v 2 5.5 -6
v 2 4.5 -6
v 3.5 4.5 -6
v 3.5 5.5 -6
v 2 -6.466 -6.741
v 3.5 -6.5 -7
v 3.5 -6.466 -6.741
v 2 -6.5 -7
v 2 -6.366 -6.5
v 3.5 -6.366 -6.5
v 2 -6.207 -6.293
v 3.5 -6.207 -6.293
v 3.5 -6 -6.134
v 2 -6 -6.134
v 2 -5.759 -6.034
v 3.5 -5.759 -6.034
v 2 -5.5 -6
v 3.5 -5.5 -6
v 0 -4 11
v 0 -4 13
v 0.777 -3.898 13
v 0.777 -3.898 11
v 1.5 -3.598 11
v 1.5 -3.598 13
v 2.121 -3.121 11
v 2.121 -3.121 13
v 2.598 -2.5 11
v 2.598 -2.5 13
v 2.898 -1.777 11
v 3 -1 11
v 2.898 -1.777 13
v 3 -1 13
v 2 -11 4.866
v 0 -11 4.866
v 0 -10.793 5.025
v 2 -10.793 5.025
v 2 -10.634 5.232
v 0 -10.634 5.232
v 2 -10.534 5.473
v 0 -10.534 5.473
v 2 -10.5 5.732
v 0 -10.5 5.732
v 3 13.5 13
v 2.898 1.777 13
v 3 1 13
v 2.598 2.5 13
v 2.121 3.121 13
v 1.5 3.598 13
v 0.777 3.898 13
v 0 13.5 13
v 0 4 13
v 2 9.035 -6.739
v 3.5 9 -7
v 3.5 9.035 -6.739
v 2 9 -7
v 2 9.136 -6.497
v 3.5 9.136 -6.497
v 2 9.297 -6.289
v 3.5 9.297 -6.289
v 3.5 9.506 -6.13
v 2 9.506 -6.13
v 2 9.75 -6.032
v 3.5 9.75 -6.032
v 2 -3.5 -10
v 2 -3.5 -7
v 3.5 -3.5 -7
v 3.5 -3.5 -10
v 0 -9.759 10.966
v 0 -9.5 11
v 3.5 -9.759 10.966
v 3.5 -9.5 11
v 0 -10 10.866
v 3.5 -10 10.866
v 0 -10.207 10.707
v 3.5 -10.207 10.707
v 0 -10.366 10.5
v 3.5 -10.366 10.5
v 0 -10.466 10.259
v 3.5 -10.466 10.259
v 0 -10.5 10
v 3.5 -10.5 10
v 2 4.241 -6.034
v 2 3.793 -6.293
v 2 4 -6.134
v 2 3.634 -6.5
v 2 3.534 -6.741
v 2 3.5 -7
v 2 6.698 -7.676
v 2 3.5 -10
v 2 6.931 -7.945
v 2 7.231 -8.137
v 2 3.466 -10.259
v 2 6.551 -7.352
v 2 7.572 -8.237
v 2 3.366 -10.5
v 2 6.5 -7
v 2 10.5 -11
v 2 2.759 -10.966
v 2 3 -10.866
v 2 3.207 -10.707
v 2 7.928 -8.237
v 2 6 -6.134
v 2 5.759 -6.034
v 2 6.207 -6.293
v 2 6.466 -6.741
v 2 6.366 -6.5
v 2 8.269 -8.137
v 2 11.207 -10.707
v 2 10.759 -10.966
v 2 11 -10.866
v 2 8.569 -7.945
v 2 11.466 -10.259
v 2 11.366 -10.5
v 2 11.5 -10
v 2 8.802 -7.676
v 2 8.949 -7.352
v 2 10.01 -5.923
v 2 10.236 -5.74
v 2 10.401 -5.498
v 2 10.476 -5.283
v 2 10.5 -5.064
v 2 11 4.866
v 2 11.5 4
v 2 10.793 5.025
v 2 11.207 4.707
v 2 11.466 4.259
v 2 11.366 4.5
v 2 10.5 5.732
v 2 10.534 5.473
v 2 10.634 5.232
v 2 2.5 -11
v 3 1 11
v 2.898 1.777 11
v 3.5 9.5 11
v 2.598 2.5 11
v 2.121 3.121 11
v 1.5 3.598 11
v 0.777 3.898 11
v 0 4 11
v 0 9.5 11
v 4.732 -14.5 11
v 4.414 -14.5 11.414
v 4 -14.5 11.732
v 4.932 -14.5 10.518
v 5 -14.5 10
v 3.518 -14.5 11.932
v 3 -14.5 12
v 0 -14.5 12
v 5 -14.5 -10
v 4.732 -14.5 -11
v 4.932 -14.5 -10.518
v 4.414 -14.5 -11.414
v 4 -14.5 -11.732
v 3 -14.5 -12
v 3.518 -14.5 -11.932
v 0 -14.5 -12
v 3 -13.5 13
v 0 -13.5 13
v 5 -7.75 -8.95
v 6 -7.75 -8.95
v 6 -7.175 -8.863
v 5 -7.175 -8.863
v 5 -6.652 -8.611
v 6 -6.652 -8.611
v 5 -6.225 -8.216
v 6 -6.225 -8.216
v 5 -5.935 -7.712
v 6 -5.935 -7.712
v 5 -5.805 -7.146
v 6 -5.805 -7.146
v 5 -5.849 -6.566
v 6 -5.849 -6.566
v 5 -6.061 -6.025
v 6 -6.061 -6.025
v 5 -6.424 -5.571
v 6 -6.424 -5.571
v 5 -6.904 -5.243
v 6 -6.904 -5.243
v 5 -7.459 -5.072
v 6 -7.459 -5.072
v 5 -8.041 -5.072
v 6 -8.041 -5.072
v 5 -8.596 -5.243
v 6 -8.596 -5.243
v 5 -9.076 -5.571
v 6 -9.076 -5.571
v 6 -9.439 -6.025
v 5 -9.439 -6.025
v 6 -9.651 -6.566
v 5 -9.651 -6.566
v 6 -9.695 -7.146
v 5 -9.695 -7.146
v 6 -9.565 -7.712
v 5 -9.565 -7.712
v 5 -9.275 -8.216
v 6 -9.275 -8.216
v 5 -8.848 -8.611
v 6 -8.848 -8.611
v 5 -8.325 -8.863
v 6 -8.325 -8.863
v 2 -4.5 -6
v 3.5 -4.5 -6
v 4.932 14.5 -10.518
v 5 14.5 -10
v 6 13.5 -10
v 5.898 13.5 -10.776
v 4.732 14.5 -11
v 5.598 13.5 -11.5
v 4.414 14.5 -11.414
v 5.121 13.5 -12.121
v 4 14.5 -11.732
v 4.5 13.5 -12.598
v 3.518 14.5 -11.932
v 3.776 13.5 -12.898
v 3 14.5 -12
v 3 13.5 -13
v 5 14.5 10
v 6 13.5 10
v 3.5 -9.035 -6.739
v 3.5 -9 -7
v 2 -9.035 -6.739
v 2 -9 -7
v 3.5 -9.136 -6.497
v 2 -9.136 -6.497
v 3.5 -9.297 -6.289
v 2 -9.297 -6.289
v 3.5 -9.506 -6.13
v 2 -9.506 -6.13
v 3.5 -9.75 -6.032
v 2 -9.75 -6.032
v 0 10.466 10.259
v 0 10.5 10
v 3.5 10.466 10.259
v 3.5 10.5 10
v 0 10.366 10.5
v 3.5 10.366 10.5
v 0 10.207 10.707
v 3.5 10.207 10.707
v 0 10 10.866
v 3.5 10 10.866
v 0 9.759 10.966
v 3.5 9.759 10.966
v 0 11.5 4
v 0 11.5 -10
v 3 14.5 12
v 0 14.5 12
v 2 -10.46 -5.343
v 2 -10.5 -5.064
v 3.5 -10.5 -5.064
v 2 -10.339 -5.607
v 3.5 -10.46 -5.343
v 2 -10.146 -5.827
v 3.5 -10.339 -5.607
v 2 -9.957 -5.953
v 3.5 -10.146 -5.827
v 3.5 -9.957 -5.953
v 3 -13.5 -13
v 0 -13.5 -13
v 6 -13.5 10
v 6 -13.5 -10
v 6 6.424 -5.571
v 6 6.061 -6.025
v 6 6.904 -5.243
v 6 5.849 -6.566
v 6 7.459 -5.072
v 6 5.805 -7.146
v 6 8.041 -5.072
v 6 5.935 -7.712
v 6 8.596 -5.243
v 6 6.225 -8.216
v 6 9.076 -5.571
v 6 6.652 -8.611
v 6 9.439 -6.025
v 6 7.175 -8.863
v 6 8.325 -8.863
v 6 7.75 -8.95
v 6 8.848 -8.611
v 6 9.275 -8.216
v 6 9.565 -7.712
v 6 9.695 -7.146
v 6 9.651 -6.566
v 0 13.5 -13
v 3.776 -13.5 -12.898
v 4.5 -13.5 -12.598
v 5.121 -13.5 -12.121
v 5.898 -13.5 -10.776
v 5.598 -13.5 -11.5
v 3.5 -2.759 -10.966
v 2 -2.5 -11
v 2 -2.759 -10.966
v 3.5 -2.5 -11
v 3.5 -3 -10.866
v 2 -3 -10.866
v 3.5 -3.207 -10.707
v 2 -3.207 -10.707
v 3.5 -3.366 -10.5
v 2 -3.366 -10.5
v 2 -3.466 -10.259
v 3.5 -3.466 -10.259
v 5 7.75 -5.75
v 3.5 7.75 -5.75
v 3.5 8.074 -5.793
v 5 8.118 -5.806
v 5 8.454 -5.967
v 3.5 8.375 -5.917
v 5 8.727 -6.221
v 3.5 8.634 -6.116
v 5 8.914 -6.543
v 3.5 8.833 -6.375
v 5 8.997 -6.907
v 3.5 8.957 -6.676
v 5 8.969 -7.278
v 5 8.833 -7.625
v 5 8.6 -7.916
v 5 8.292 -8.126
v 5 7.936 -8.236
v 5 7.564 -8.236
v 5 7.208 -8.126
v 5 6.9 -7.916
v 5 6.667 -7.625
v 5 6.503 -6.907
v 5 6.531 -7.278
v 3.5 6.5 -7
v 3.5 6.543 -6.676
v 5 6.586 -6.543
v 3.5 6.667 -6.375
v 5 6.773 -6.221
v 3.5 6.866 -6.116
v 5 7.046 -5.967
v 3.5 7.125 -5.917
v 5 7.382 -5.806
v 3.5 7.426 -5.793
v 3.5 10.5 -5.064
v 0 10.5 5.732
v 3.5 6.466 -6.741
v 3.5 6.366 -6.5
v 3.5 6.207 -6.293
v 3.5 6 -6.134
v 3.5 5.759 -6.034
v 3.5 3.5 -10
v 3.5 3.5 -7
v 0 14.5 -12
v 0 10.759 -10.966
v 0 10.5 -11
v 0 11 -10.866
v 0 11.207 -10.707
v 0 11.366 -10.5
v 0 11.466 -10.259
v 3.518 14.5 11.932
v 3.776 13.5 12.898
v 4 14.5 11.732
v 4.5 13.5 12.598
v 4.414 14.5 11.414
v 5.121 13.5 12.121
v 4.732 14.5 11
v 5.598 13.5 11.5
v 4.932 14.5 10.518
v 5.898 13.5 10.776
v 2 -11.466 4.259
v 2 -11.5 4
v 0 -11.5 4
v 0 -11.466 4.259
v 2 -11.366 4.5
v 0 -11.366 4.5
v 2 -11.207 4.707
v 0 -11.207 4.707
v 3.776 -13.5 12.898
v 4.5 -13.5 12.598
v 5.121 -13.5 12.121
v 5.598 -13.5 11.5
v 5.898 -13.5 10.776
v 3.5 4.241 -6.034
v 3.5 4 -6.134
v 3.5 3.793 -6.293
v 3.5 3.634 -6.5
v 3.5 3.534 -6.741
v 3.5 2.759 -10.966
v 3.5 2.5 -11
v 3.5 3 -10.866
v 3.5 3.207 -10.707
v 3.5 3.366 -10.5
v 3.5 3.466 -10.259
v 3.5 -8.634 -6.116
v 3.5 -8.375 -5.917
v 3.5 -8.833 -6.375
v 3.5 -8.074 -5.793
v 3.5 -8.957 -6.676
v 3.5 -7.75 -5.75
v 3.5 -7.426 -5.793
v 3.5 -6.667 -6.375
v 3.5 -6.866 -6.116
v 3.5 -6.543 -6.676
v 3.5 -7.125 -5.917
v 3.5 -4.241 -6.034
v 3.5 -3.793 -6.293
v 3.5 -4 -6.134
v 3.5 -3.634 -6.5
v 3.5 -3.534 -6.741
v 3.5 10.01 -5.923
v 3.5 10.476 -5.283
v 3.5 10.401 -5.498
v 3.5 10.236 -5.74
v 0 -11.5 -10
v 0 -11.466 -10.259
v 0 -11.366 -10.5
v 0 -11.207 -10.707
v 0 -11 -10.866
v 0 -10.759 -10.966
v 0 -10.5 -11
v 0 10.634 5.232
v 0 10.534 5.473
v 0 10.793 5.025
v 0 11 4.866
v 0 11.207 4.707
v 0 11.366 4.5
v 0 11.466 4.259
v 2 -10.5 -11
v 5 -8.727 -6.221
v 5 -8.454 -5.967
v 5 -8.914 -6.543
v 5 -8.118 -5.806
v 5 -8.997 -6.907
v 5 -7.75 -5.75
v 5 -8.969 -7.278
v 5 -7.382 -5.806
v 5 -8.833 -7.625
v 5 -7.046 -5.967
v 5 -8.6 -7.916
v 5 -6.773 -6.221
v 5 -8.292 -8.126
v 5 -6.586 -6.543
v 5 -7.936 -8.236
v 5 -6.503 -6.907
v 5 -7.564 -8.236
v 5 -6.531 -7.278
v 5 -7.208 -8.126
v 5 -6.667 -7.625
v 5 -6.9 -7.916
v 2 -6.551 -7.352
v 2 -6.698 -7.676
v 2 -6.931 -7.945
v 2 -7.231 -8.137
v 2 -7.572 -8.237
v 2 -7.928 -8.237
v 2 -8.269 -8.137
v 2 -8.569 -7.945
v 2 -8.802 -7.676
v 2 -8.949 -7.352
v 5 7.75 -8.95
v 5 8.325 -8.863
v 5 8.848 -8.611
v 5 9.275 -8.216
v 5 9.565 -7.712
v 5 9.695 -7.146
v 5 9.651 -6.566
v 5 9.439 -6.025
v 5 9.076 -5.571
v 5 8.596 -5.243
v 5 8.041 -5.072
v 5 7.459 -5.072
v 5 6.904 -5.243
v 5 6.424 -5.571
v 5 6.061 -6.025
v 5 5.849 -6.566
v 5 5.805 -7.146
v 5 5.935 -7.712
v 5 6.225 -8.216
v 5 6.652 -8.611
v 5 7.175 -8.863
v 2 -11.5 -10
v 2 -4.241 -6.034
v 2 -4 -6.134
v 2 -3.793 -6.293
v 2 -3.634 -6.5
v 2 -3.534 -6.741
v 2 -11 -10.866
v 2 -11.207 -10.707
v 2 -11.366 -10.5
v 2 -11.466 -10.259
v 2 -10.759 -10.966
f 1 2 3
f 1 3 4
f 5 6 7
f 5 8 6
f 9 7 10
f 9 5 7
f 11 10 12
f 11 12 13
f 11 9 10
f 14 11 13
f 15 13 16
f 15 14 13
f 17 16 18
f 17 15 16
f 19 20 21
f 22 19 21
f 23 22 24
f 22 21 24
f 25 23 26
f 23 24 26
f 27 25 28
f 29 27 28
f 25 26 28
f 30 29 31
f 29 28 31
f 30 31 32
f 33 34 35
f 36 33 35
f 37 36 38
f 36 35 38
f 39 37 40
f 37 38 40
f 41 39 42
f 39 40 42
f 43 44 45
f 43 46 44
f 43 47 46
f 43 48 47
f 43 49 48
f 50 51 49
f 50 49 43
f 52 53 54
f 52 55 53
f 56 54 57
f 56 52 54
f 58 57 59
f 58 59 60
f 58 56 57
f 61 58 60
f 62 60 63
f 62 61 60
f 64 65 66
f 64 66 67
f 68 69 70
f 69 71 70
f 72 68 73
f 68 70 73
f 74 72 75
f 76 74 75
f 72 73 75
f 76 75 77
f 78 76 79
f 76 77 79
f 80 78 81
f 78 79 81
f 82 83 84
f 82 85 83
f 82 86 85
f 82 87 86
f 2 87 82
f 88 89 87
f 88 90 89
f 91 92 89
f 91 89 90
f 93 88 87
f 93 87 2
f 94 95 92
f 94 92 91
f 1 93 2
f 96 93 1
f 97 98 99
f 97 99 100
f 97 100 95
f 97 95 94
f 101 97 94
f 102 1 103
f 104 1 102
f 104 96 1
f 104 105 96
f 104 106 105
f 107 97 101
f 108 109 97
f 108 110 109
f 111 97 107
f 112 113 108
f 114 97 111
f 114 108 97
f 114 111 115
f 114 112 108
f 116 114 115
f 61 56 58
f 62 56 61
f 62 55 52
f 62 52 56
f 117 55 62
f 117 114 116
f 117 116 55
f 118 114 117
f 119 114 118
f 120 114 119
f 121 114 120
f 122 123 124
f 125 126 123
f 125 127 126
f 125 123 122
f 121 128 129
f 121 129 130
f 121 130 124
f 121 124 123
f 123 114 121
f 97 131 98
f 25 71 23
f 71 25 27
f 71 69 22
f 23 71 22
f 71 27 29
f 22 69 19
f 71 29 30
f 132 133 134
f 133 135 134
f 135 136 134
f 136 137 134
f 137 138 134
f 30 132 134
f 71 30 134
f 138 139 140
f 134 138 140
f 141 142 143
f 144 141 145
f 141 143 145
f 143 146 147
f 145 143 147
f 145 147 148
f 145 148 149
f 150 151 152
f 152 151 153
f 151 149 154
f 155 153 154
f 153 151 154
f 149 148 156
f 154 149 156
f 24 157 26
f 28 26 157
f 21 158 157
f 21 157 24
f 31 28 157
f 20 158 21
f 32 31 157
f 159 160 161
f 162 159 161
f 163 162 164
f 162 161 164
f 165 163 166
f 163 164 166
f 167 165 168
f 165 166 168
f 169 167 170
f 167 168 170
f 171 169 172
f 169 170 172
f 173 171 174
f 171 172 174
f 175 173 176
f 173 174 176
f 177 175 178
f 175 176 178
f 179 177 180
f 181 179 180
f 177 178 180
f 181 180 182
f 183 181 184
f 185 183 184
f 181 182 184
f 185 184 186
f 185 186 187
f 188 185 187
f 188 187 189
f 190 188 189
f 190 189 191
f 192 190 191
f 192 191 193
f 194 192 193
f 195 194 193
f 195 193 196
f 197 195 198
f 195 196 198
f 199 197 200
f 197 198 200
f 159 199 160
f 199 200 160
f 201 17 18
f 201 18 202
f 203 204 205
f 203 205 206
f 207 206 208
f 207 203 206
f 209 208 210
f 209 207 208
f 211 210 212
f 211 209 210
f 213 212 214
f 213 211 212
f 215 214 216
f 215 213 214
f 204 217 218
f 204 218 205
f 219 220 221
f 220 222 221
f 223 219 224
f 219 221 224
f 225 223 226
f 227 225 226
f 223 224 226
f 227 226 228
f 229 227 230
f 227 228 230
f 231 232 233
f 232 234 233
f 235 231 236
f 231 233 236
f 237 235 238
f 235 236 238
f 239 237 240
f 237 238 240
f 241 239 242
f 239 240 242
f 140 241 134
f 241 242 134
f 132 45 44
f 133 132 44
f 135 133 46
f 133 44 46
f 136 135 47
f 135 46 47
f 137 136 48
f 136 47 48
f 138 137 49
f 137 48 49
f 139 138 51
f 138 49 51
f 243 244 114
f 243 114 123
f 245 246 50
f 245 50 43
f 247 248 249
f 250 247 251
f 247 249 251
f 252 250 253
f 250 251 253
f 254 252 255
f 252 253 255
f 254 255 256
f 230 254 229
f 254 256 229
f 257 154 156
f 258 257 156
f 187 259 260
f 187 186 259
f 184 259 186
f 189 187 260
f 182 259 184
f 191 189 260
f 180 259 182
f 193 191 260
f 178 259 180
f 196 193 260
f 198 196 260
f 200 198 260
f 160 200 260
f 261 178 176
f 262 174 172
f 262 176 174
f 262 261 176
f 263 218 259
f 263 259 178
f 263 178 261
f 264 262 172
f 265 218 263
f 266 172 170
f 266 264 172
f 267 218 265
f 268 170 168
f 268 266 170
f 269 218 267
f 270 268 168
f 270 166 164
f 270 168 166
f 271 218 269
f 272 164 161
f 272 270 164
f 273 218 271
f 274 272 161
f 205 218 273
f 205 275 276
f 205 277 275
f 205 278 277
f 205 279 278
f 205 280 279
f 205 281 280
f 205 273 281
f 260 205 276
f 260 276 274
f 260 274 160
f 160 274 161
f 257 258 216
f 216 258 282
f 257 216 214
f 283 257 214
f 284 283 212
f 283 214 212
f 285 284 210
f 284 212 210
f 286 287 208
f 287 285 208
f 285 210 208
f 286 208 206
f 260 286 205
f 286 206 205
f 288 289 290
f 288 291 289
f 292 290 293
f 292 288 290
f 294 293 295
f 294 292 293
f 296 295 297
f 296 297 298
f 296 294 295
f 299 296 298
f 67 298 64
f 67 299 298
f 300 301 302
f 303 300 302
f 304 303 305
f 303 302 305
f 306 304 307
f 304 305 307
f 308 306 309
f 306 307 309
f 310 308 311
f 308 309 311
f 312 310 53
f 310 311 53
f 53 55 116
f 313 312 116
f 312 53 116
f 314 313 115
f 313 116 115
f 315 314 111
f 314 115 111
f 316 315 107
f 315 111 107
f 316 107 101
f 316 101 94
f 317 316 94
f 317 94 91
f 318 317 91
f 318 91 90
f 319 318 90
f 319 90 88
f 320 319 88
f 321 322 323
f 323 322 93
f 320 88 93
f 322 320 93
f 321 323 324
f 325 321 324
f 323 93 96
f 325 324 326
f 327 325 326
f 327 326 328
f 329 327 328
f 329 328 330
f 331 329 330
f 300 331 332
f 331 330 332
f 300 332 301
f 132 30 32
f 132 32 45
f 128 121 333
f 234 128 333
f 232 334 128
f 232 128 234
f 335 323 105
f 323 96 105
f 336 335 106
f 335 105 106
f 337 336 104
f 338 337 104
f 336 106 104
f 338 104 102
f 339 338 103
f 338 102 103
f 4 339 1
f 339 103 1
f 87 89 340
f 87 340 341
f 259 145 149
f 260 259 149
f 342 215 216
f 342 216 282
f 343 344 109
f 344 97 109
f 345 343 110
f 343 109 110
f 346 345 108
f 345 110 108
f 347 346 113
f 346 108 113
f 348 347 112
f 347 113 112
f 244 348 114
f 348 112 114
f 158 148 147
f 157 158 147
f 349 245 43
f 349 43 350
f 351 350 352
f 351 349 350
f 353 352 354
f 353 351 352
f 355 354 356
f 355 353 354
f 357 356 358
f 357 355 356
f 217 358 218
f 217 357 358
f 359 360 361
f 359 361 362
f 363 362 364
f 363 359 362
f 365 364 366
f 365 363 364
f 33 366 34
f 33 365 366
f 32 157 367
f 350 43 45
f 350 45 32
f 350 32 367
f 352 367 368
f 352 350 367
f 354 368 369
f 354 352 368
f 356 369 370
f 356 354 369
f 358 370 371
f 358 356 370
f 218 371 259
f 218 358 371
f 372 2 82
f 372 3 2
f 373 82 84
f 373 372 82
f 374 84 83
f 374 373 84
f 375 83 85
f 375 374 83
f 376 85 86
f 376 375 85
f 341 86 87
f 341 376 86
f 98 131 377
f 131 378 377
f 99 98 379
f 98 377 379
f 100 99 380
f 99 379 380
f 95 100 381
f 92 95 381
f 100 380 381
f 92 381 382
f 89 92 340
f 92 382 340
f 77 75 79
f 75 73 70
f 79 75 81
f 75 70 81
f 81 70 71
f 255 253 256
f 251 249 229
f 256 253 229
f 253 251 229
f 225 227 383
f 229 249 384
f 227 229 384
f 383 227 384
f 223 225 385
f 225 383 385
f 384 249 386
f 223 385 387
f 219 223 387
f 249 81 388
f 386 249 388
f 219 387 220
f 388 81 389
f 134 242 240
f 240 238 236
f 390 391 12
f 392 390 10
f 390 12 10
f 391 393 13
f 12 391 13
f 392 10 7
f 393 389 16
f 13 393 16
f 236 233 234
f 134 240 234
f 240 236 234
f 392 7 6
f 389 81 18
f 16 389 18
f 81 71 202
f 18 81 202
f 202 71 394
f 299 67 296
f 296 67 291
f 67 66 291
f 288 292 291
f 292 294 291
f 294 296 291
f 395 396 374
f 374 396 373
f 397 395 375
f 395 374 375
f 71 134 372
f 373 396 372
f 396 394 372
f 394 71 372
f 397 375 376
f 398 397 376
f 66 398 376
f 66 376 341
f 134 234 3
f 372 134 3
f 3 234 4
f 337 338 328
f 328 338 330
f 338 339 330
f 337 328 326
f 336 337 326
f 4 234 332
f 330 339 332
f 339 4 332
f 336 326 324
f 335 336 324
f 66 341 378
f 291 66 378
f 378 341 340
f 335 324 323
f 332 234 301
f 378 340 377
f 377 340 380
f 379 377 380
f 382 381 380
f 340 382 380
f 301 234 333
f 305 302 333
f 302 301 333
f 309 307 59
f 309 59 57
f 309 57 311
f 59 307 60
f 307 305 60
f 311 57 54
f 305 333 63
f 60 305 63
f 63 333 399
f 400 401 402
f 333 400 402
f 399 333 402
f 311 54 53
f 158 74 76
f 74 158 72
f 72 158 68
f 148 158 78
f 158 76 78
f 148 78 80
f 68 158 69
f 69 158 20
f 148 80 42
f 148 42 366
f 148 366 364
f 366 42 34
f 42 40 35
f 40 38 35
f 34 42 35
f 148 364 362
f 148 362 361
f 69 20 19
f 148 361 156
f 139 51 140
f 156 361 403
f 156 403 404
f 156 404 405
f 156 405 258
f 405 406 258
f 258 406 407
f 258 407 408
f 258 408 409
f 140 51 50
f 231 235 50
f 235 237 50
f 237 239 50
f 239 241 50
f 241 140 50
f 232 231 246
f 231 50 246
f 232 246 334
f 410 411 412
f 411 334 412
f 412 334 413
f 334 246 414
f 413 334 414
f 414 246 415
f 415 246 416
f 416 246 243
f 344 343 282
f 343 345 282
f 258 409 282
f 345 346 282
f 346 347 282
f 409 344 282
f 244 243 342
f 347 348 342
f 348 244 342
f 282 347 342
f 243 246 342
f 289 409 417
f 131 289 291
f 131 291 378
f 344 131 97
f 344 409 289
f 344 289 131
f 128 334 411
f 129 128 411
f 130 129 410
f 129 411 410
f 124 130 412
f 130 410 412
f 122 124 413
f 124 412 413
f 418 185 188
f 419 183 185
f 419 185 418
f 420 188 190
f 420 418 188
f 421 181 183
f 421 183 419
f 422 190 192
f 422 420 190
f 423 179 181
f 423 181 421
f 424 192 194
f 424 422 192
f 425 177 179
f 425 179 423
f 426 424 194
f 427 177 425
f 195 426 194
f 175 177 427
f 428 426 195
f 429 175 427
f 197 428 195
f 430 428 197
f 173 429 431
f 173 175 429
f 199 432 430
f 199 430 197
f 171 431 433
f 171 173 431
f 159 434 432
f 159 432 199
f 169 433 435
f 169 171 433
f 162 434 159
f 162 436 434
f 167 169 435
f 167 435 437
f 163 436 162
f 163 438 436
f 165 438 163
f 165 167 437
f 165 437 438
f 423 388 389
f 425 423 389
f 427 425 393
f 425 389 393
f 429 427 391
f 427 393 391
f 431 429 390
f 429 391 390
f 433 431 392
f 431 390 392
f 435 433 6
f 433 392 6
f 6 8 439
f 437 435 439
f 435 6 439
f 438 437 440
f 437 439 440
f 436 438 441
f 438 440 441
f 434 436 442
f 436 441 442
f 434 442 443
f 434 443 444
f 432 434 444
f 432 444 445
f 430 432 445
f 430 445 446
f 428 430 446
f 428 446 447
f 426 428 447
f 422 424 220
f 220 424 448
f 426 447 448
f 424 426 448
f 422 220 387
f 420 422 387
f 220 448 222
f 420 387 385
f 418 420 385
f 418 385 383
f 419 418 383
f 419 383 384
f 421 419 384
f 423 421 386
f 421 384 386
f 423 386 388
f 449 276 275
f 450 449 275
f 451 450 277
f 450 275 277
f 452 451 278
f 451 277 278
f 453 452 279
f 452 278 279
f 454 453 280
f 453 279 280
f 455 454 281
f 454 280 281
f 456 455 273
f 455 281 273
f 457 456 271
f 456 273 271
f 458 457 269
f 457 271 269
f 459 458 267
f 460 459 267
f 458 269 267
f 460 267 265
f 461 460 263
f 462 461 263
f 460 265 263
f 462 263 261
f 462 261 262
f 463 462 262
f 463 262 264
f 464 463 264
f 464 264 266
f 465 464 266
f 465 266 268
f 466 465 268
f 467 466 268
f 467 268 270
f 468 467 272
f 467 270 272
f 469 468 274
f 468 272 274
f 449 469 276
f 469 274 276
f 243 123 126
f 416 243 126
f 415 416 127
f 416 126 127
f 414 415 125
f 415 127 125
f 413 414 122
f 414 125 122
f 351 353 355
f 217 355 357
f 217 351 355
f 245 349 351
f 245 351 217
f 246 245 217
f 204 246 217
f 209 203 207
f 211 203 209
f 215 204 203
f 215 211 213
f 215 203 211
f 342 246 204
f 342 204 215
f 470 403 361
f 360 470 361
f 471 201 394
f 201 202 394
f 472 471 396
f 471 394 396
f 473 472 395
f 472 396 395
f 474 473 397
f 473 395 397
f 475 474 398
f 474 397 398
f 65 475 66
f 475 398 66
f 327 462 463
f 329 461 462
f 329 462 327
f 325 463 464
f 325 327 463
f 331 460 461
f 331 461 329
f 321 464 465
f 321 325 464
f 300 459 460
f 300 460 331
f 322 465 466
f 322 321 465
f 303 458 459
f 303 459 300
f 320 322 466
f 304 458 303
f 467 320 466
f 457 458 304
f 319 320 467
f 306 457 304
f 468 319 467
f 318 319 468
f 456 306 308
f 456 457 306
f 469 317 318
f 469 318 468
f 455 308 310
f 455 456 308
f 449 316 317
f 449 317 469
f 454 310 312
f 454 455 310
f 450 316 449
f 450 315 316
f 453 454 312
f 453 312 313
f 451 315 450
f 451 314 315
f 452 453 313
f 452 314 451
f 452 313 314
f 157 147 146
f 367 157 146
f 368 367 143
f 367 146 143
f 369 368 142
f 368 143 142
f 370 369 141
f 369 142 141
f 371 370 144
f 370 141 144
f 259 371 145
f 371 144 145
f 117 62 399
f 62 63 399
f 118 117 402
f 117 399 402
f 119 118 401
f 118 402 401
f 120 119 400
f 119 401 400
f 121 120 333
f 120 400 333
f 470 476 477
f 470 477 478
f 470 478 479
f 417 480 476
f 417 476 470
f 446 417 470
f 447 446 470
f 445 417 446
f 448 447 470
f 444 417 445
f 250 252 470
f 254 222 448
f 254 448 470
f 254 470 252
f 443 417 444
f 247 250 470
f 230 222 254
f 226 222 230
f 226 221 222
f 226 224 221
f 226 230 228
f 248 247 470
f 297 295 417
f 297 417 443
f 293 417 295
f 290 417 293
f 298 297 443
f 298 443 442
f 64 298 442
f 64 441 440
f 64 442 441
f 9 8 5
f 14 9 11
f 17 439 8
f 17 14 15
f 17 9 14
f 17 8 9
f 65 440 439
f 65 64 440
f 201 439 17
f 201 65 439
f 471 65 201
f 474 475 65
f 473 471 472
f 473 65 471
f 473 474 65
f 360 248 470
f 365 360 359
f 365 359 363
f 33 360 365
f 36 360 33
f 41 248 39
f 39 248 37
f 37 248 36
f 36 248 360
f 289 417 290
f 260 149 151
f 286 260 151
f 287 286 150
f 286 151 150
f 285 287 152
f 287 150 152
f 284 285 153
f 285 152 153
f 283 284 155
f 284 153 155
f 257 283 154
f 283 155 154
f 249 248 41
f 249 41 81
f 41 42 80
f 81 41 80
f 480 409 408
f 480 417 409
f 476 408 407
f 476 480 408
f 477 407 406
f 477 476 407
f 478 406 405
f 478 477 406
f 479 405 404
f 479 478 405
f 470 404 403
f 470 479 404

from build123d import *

# Parameters (mm, degrees)
SKETCH_1_W          = 26
SKETCH_1_H          = 29
EXTRUDE_1_DEPTH     = 6
SKETCH_2_R          = 1.25
CUT_EXTRUDE_1_DEPTH = 21.377683872
SKETCH_4_W          = 16
SKETCH_4_H          = 23
CUT_EXTRUDE_3_DEPTH = 2
CUT_EXTRUDE_4_DEPTH = 1.5
FILLET_1_R          = 1
SKETCH_6_R          = 1.95
CUT_EXTRUDE_5_DEPTH = 1
FILLET_3_R          = 3
SKETCH_8_W          = 6
SKETCH_8_H          = 21
CUT_EXTRUDE_6_DEPTH = 3.5
FILLET_2_R          = 1
FILLET_4_R          = 1
CUT_EXTRUDE_7_REACH = 30.675
SKETCH_9_W          = 6
SKETCH_9_H          = 8
FILLET_5_R          = 3
CHAMFER_2_SIZE      = 1


# Some blends are built 0.0001 mm under size
with BuildPart() as part:
    # Эскиз1 → Бобышка-Вытянуть1 (new body)
    with BuildSketch(Plane(origin=(0, 0, 0), x_dir=(0, 0, -1), z_dir=(1, 0, 0))):
        Rectangle(SKETCH_1_W, SKETCH_1_H)
    extrude(amount=EXTRUDE_1_DEPTH)

    # Эскиз2 → Вырез-Вытянуть1 (cut, through all)
    with BuildSketch(Plane.ZY):
        with Locations((-7, 7.75)):
            Circle(SKETCH_2_R)
        with Locations((-7, -7.75)):
            Circle(SKETCH_2_R)
    extrude(amount=-CUT_EXTRUDE_1_DEPTH, mode=Mode.SUBTRACT)

    # Эскиз4 → Вырез-Вытянуть3 (cut)
    with BuildSketch(Plane.ZY):
        with Locations((-3, 0)):
            Rectangle(SKETCH_4_W, SKETCH_4_H)
    extrude(amount=-CUT_EXTRUDE_3_DEPTH, mode=Mode.SUBTRACT)

    # Эскиз5 → Вырез-Вытянуть4 (cut)
    with BuildSketch(Plane.ZY.offset(-2)):
        Polygon((-11, -3.5), (-11, 3.5), (-6, 3.5), (-6, 10.5), (5, 10.5), (5, -10.5), (-6, -10.5), (-6, -3.5), align=None)
    extrude(amount=-CUT_EXTRUDE_4_DEPTH, mode=Mode.SUBTRACT)

    # Скругление1
    fillet_1_edges = [part.edges().sort_by_distance(p)[0] for p in [
        (2.75, 7, -6),
        (2.75, 3.5, -6),
        (2.75, 8.5, -6),
        (2.75, -8.5, -6),
        (2.75, -7, -6),
        (2.75, 3.5, -11),
        (2.75, -3.5, -6),
        (2.75, -3.5, -11),
    ]]
    fillet(fillet_1_edges, radius=FILLET_1_R)

    # Эскиз6 → Вырез-Вытянуть5 (cut)
    with BuildSketch(Plane(origin=(6, 0, 0), x_dir=(0, 0, -1), z_dir=(1, 0, 0))):
        with Locations((7, 7.75)):
            Circle(SKETCH_6_R)
        with Locations((7, -7.75)):
            Circle(SKETCH_6_R)
    extrude(amount=-CUT_EXTRUDE_5_DEPTH, mode=Mode.SUBTRACT)

    # Скругление3
    fillet_3_edges = [part.edges().sort_by_distance(p)[0] for p in [
        (6, 0, 13),
        (6, 0, -13),
    ]]
    fillet(fillet_3_edges, radius=FILLET_3_R)

    # Эскиз8 → Вырез-Вытянуть6 (cut)
    with BuildSketch(Plane.ZY):
        with Locations((8, 0)):
            Rectangle(SKETCH_8_W, SKETCH_8_H)
    extrude(amount=-CUT_EXTRUDE_6_DEPTH, mode=Mode.SUBTRACT)

    # Скругление2
    fillet_2_edges = [part.edges().sort_by_distance(p)[0] for p in [
        (1, -11.5, -11),
        (1, -11.5, 5),
        (2.75, -10.5, -6),
        (1, 11.5, -11),
        (1, 11.5, 5),
        (2.75, 10.5, -6),
        (1.75, -10.5, 11),
        (1.75, 10.5, 11),
    ]]
    fillet(fillet_2_edges, radius=FILLET_2_R - 0.0001)  # a hair under: the kernel refuses the full size

    # Скругление4
    # the kernel refuses this fillet: 1 mm, written as the material it takes off along each edge
    with BuildSketch(Plane(origin=(-1.830232679, -10.5, 5), x_dir=(0, 0, 1), z_dir=(1, 0, 0))) as fillet_4_piece_1:
        with BuildLine():
            CenterArc((0.732093072, 1), FILLET_4_R, 209.998345944, 60.001654056)
            Line((-0.133946766, 0.500025001), (-0.22055075, 0.450027501))
            ThreePointArc((-0.22055075, 0.450027501), (-0.1, 0.0001), (-0.1, 0))
            Line((-0.1, 0), (0, -0.1))
            Line((0, -0.1), (0.732093072, -0.1))
            Line((0.732093072, -0.1), (0.732093072, 0))
        make_face()
    extrude(amount=3.830232679, mode=Mode.SUBTRACT)
    with BuildSketch(Plane(origin=(-1.830232679, 10.5, 5), x_dir=(0, 0, 1), z_dir=(1, 0, 0))) as fillet_4_piece_2:
        with BuildLine():
            CenterArc((0.732093072, -1), FILLET_4_R, 90, 60.001654056)
            Line((-0.133946766, -0.500025001), (-0.22055075, -0.450027501))
            ThreePointArc((-0.22055075, -0.450027501), (-0.1, -0.0001), (-0.1, 0))
            Line((-0.1, 0), (0, 0.1))
            Line((0, 0.1), (0.732093072, 0.1))
            Line((0.732093072, 0.1), (0.732093072, 0))
        make_face()
    extrude(amount=3.830232679, mode=Mode.SUBTRACT)

    # Эскиз9 → Вырез-Вытянуть7 (cut, up to next)
    with BuildSketch(Plane(origin=(0, 0, 11), x_dir=(-1, 0, 0), z_dir=(0, 0, -1)), mode=Mode.PRIVATE) as cut_extrude_7_sk1:
        Rectangle(SKETCH_9_W, SKETCH_9_H)
    cut_extrude_7_tool1 = extrude(cut_extrude_7_sk1.sketch, amount=-CUT_EXTRUDE_7_REACH, mode=Mode.PRIVATE) & part.part
    add(cut_extrude_7_tool1.solids().sort_by_distance((0, 0, 11))[0], mode=Mode.SUBTRACT)

    # Скругление5
    fillet_5_edges = [part.edges().sort_by_distance(p)[0] for p in [
        (3, -4, 12),
        (3, 4, 12),
    ]]
    fillet(fillet_5_edges, radius=FILLET_5_R - 0.0001)  # a hair under: the kernel refuses the full size

    # Фаска2
    chamfer_2_edges = [part.edges().sort_by_distance(p)[0] for p in [
        (6, 14.5, 0),
        (6, -14.5, 0),
        (1.5, -14.5, -13),
        (1.5, -14.5, 13),
        (5.121320344, -14.5, -12.121320344),
        (5.121320344, -14.5, 12.121320344),
        (1.5, 14.5, 13),
        (1.5, 14.5, -13),
        (5.121320344, 14.5, -12.121320344),
        (5.121320344, 14.5, 12.121320344),
    ]]
    chamfer(chamfer_2_edges, length=CHAMFER_2_SIZE)


solid = part.part
